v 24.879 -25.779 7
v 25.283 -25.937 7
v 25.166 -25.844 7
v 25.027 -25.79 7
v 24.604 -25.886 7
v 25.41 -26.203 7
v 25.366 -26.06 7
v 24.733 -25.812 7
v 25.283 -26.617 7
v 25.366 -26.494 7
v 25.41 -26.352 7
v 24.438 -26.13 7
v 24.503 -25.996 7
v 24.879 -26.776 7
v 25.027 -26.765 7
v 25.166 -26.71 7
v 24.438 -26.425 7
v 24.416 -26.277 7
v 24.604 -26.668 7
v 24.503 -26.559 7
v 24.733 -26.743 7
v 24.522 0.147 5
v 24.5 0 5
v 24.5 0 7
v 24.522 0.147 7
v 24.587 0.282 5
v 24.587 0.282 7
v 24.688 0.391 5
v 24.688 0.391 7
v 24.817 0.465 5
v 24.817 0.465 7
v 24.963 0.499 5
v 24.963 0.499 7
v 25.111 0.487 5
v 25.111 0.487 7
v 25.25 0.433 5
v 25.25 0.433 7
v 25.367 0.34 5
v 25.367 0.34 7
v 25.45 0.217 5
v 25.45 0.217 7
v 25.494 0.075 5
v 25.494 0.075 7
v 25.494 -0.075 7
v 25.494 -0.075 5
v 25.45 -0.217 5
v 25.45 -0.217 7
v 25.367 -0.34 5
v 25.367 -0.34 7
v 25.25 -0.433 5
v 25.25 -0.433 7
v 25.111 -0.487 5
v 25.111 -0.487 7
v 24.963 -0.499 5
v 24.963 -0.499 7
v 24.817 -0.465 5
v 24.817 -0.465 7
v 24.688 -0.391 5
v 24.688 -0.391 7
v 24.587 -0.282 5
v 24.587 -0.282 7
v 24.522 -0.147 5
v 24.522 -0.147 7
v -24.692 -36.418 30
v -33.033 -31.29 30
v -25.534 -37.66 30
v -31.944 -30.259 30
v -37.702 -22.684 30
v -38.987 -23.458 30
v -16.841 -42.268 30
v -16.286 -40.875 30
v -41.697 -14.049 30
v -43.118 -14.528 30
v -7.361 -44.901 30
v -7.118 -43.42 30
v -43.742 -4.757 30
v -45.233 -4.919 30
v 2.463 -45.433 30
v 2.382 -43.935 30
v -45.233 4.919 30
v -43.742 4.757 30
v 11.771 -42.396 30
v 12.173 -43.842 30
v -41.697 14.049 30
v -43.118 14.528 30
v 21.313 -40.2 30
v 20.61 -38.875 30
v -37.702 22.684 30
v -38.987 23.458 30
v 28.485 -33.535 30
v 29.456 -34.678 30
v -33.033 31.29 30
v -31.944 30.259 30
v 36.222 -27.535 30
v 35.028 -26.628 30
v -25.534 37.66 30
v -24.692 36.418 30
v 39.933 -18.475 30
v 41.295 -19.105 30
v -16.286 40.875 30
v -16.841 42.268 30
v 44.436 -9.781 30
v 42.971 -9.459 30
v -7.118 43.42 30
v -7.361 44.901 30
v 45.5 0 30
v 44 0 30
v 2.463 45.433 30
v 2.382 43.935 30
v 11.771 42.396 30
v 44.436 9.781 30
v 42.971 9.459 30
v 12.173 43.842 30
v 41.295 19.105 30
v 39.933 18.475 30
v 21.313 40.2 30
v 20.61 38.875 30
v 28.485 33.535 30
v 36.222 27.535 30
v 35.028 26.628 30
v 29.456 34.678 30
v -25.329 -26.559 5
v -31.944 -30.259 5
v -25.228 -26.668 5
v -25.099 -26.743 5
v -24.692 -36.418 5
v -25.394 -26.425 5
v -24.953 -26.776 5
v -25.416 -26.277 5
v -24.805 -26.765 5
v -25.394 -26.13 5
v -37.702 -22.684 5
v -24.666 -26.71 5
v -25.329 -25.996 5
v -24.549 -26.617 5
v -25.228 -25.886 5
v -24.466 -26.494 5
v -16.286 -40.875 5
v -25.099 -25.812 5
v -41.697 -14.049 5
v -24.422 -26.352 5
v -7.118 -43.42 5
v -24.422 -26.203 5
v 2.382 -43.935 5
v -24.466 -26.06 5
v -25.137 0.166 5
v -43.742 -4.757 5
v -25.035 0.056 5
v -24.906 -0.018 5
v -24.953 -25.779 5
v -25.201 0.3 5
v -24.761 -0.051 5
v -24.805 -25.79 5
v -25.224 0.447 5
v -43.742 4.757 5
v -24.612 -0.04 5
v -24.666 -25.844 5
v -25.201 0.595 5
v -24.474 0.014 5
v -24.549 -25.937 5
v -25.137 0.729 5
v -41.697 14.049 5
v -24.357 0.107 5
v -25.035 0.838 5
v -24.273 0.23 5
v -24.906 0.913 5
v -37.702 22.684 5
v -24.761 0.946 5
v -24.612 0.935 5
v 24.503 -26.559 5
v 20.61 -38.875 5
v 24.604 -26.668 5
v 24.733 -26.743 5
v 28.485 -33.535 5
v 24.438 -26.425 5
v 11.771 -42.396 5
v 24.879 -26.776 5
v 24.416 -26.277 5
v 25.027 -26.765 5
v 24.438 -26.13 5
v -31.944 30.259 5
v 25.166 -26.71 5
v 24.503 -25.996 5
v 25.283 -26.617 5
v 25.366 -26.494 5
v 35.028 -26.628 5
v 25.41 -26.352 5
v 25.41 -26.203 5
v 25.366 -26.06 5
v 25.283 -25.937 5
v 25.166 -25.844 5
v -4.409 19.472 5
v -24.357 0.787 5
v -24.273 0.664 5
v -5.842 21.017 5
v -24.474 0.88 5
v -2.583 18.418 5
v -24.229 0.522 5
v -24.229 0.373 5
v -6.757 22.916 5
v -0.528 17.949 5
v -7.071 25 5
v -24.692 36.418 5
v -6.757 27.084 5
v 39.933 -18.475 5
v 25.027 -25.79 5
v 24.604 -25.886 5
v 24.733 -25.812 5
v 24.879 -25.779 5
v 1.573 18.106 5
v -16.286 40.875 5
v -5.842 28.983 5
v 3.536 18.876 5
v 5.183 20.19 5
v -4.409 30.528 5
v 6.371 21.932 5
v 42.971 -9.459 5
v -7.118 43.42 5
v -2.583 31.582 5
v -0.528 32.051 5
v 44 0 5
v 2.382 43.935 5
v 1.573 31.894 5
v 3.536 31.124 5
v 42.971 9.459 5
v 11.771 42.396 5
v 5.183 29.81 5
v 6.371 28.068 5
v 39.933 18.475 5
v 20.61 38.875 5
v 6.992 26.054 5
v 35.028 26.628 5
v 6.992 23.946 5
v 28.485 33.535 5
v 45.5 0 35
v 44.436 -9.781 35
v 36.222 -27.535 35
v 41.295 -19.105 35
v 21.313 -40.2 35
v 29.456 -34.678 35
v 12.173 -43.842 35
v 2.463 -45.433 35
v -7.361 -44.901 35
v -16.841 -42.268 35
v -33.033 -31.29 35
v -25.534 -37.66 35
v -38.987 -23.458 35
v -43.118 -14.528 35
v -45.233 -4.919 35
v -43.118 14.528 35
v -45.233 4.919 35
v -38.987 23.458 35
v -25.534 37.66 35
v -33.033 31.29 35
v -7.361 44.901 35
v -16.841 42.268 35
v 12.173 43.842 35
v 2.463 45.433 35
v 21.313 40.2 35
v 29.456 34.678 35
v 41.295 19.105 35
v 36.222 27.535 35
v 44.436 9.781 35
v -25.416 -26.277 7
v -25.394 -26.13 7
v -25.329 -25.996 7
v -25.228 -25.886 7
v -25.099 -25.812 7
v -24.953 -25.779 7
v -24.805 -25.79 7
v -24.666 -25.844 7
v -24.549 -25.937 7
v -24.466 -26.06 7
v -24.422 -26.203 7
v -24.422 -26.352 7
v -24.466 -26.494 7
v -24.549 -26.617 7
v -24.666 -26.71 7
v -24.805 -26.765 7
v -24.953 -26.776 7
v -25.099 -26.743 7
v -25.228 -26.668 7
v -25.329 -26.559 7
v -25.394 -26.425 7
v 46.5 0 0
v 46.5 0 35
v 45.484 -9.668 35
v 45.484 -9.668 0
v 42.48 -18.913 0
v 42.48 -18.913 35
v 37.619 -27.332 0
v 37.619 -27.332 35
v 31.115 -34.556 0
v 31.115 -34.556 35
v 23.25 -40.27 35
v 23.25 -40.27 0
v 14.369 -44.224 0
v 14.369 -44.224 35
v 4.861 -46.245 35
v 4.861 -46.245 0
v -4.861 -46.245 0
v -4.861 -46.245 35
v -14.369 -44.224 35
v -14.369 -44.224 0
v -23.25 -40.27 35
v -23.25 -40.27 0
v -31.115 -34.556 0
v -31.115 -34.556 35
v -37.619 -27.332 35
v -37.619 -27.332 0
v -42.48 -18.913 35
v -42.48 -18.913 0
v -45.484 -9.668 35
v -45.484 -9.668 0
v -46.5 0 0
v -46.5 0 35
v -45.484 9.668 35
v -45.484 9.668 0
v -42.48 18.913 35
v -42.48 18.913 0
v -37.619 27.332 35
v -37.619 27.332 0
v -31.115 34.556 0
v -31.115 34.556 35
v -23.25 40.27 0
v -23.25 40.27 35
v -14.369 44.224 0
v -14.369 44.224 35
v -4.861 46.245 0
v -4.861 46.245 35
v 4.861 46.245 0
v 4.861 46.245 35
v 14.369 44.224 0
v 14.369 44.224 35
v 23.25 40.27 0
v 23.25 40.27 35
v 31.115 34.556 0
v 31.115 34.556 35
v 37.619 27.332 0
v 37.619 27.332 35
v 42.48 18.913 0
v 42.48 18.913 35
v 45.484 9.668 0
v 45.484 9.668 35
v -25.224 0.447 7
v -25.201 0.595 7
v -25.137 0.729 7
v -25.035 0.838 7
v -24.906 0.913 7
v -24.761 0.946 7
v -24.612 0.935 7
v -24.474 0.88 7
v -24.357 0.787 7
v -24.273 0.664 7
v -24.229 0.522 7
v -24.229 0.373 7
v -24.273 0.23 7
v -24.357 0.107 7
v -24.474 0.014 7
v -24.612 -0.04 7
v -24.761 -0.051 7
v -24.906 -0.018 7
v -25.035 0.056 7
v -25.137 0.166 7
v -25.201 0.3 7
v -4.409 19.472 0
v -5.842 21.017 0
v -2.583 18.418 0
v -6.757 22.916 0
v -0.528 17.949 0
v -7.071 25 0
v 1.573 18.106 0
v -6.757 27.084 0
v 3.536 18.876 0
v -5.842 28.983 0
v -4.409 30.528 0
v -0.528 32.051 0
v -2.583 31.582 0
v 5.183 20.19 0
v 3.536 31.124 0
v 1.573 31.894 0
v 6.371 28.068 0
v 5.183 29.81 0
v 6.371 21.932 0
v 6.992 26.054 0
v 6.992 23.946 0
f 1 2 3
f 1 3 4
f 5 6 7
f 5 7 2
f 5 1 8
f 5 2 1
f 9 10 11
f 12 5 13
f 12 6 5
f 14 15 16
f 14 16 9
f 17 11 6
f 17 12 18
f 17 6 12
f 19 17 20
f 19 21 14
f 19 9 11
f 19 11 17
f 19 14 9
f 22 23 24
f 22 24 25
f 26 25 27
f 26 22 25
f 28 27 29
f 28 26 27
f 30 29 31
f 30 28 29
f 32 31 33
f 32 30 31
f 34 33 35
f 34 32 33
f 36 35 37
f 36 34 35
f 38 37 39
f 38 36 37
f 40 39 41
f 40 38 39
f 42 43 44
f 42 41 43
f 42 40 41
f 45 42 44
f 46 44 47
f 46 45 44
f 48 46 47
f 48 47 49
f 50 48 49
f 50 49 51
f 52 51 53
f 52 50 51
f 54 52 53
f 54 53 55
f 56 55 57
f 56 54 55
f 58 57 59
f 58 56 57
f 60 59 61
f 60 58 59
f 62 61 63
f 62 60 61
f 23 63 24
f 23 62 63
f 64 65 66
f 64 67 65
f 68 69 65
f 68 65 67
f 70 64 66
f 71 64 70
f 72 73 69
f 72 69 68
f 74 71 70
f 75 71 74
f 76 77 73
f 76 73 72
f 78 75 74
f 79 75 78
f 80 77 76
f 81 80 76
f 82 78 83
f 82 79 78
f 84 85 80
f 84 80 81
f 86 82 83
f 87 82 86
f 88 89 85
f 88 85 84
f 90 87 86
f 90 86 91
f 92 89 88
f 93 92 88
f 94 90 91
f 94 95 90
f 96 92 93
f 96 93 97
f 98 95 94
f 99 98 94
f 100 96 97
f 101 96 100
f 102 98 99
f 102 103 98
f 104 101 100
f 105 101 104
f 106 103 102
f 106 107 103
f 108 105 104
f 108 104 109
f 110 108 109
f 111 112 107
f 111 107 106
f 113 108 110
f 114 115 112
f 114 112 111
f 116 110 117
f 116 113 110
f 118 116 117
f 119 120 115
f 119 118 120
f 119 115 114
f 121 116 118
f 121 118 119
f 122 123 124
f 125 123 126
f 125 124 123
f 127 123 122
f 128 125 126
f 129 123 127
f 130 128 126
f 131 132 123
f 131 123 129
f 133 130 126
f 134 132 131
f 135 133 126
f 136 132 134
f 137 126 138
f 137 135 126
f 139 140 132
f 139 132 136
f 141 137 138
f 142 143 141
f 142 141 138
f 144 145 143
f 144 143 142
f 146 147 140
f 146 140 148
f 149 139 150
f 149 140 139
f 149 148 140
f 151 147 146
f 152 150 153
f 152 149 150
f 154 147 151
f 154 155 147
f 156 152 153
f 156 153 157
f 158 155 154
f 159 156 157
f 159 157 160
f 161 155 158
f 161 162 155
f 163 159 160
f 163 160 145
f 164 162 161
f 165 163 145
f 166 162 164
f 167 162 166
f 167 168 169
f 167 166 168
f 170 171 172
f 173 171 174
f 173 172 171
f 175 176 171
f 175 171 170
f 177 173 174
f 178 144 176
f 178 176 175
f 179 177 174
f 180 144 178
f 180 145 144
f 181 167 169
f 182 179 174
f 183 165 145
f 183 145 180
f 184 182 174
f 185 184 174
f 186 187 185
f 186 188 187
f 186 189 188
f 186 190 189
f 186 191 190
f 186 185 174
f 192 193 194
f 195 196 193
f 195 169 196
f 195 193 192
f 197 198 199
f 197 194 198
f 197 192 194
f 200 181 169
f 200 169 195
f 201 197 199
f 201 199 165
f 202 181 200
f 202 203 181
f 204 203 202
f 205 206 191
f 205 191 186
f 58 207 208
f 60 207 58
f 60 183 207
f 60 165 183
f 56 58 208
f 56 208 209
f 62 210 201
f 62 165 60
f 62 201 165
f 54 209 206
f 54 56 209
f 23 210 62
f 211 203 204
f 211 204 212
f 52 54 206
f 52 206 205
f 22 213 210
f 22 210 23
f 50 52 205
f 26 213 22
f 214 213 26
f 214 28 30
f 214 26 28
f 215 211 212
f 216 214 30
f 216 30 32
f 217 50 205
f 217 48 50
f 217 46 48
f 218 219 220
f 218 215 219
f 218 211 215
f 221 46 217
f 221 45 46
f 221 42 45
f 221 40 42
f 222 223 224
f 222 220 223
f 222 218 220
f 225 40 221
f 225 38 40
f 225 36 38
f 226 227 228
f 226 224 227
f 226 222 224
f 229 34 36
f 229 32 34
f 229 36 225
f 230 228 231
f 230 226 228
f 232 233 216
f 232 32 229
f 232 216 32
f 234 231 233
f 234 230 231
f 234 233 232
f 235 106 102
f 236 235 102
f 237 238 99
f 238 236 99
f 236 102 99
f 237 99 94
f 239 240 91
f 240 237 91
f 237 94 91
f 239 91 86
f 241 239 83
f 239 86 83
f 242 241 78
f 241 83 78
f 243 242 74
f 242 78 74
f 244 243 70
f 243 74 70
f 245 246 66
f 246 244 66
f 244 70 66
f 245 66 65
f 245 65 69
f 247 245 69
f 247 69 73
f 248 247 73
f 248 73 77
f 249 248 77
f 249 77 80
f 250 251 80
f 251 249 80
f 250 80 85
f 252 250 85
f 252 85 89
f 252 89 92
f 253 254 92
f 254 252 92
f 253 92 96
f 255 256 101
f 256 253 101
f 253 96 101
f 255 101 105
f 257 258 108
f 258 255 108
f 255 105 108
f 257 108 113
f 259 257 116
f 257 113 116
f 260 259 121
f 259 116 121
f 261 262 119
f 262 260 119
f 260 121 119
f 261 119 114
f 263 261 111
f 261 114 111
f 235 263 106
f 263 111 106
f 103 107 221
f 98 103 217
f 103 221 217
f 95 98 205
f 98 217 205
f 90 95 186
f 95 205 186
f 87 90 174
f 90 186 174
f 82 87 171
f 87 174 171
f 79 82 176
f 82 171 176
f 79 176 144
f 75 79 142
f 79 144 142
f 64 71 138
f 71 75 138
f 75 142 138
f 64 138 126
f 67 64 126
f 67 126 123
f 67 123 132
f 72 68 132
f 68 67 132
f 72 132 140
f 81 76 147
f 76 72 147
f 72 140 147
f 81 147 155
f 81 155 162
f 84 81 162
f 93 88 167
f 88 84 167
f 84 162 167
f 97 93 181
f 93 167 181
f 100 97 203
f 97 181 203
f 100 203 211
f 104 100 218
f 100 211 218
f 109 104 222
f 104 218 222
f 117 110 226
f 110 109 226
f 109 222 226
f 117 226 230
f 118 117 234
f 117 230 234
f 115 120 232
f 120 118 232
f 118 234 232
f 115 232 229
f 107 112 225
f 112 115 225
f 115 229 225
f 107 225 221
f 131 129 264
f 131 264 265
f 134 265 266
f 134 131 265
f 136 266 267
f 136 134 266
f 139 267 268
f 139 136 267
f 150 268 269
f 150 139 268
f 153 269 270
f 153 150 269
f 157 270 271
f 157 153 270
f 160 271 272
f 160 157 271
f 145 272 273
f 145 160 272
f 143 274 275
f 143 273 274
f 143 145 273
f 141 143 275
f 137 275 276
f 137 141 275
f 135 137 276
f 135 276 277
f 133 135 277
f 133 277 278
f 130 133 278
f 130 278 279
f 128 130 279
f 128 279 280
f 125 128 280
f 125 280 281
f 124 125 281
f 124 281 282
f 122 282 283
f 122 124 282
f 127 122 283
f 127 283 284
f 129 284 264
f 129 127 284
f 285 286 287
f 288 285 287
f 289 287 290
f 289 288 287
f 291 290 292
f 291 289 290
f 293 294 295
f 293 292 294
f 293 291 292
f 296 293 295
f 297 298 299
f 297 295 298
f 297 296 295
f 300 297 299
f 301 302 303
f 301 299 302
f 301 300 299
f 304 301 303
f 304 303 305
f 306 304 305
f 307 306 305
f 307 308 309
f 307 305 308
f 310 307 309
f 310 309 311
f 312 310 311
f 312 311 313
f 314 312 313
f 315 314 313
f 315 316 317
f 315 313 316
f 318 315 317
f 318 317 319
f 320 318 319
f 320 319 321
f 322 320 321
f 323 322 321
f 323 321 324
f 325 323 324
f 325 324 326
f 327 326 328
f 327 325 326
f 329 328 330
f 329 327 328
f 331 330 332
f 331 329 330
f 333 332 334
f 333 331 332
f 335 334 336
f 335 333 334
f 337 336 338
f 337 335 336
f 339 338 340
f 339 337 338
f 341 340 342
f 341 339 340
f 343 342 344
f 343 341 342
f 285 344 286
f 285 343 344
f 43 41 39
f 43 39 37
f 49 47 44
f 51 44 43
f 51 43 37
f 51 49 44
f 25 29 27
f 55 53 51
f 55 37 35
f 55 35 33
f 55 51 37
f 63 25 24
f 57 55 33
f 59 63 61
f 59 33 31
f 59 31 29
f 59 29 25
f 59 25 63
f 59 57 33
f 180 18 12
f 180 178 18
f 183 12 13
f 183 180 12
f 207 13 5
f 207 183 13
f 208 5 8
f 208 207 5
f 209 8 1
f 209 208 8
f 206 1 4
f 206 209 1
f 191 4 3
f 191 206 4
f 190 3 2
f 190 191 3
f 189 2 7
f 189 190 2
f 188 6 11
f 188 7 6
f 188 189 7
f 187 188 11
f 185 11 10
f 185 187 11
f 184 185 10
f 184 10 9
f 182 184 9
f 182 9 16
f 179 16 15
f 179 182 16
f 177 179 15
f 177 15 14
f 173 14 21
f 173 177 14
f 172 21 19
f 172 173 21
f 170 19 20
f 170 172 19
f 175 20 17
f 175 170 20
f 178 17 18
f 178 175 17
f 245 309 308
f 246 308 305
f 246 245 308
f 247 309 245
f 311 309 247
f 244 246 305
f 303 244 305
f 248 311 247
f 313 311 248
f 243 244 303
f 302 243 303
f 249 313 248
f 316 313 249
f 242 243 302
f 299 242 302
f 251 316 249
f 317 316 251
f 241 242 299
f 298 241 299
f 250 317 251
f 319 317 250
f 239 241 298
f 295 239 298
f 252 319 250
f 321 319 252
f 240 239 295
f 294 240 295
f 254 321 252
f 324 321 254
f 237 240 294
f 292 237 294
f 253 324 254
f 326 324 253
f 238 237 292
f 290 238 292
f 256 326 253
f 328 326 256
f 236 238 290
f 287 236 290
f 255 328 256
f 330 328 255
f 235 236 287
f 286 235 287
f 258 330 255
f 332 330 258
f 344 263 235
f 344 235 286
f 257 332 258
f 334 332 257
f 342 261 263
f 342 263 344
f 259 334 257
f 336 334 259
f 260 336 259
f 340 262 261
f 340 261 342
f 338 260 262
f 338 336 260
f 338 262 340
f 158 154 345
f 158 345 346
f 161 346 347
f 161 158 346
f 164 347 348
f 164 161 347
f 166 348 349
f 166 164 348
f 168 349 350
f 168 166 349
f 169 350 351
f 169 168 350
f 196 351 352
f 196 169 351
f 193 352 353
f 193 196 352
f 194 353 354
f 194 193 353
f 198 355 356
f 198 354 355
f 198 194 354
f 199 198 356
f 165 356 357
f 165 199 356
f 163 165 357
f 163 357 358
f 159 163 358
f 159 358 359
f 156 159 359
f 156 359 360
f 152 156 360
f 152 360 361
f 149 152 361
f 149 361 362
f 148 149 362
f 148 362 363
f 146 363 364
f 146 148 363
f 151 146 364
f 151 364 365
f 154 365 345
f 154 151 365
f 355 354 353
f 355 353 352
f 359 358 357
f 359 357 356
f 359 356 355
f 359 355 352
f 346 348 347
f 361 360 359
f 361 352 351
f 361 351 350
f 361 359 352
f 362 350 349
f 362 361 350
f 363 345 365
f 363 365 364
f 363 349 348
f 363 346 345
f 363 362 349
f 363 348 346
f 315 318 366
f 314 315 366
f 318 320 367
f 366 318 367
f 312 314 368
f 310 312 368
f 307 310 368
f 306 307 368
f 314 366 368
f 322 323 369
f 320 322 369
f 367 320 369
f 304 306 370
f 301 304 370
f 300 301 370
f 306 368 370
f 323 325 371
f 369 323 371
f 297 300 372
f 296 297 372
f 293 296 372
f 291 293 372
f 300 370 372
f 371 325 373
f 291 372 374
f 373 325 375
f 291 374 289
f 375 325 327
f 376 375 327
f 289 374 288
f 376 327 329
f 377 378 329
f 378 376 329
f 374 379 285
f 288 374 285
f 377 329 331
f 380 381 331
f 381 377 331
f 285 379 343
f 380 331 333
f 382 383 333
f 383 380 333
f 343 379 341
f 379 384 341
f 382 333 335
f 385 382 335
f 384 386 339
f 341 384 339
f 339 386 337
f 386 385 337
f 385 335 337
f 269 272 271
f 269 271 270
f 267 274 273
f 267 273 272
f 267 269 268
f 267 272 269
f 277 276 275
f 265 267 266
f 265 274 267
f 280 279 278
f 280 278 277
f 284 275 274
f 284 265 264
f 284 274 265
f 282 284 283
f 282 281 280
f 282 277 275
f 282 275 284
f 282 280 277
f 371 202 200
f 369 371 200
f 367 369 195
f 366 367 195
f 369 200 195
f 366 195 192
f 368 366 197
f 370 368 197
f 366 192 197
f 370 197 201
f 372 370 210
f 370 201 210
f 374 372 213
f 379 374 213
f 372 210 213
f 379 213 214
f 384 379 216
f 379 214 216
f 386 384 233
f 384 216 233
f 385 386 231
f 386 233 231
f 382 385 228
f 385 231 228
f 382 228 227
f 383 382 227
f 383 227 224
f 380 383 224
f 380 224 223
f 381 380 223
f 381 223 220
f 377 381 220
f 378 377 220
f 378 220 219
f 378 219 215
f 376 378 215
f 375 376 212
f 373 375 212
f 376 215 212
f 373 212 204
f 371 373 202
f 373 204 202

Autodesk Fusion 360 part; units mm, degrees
sketch "Sketch1" plane through (0, 0, 0) normal (0, 0, 1) x (1, 0, 0)
  circle A0 centre (0, 0) radius 45.5
  circle A1 centre (0, 0) radius 46.5
  circle A2 centre (0, 0) radius 44
  dimension "d1" = 91
  dimension "d2" = 93
  dimension "d3" = 88
extrude "Extrude1" add sketch "Sketch1" along normal blind 5 contours A0 | A1 | A2
extrude "Extrude2" add sketch "Sketch1" along normal blind 30 contours A0
extrude "Extrude3" add sketch "Sketch1" along normal blind 35 contours A1
sketch "Sketch2" plane through (0, 0, 5) normal (0, 0, 1) x (-1, 0, 0)
  circle A0 centre (0, 0) radius 44
  line L0 (-24.5, 0) -> (24.5, 0) construction
  line L1 (24.5, 0) -> (24.5, 26) construction
  line L2 (24.5, 26) -> (-24.5, 26) construction
  line L3 (-24.5, 26) -> (-24.5, 0) construction
  circle A1 centre (-24.916, 26.2774) radius 0.5
  circle A2 centre (-25, 0) radius 0.5
  circle A3 centre (24.916, 26.2774) radius 0.5
  circle A4 centre (24.7236, -0.4472) radius 0.5
  dimension "d11" = 49
  dimension "d12" = 26
  dimension "d13" = 1
  dimension "d14" = 1
  dimension "d15" = 1
  dimension "d16" = 1
extrude "Extrude4" add sketch "Sketch2" along normal blind 2 contours A1 | A2 | A3 | A4
sketch "Sketch3" plane through (0, 0, 5) normal (0, 0, 1) x (-1, 0, 0)
  circle A0 centre (-24.916, 26.2774) radius 0.5
  circle A1 centre (24.916, 26.2774) radius 0.5
  circle A2 centre (-25, 0) radius 0.5
  circle A3 centre (24.7236, -0.4472) radius 0.5
  circle A4 centre (0, 0) radius 44
  circle A5 centre (0, -25) radius 7.0711
extrude "Extrude5" cut sketch "Sketch3" against normal blind 6 contours A5
